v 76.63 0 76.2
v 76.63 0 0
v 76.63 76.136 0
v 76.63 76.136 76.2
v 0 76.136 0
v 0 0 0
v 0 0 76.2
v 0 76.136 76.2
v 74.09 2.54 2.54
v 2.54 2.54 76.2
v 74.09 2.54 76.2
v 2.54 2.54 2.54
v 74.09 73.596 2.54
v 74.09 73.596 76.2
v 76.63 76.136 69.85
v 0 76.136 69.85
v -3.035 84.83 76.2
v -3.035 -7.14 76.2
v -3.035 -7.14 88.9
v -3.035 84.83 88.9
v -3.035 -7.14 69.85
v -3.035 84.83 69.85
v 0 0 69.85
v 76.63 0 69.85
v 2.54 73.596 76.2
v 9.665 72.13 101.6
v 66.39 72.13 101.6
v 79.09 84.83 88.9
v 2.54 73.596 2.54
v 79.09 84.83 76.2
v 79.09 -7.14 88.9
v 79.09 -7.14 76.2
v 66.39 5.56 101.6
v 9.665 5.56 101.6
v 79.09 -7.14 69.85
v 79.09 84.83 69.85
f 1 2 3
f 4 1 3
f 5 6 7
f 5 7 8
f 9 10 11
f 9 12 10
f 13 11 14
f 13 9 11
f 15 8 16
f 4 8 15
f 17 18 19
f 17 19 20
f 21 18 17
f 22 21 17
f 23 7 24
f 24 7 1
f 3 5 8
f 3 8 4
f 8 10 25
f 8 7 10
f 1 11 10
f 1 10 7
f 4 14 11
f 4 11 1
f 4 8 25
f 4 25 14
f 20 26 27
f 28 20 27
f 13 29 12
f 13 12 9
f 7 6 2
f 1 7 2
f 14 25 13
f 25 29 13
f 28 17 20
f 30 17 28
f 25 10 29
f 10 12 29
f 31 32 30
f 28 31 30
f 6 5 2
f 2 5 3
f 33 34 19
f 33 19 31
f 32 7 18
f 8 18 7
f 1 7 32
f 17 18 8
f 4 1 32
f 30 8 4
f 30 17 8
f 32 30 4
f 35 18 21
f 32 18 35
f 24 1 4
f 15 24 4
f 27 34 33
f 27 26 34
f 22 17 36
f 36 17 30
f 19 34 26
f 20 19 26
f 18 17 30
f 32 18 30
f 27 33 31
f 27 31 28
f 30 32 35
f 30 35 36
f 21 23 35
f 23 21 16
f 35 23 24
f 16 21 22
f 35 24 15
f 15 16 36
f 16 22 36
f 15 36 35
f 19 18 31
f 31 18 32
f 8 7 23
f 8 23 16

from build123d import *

# Parameters (mm, degrees)
F0_W     = 76.630168
F0_H     = 76.136313
F1_DEPTH = 76.2
F2_T     = -2.54
F3_W     = 82.124954
F3_H     = 91.969022
F3_W_2   = 76.630168
F3_H_2   = 76.136313
F4_DEPTH = 6.35
F5_W     = 82.124954
F5_H     = 91.969022
F6_DEPTH = 25.4
F7_SIZE  = 12.7


with BuildPart() as f1:
    # F0 (on Top) → F1 (new body)
    with BuildSketch(Plane.XY):
        with Locations((38.315084, 38.068157)):
            Rectangle(F0_W, F0_H)
    extrude(amount=F1_DEPTH)

    # F2
    f2_openings = [f1.faces().sort_by_distance(p)[0] for p in [
        (38.315084, 38.068157, 76.2),
    ]]
    offset(amount=F2_T, openings=f2_openings)


with BuildPart() as f4:
    # F3 (on face) → F4 (new body)
    with BuildSketch(Plane.XY.offset(76.2)):
        with Locations((38.027261, 38.844991)):
            Rectangle(F3_W, F3_H)
        with Locations((38.315084, 38.068157)):
            Rectangle(F3_W_2, F3_H_2, mode=Mode.SUBTRACT)
    extrude(amount=-F4_DEPTH)


with BuildPart() as f6:
    # F5 (on face) → F6 (new body)
    with BuildSketch(Plane.XY.offset(76.2)):
        with Locations((38.027261, 38.844991)):
            Rectangle(F5_W, F5_H)
    extrude(amount=F6_DEPTH)

    # F7
    f7_edges = [f6.edges().sort_by_distance(p)[0] for p in [
        (38.027261, -7.13952, 101.6),
        (-3.035216, 38.844991, 101.6),
        (38.027261, 84.829502, 101.6),
        (79.089738, 38.844991, 101.6),
    ]]
    chamfer(f7_edges, length=F7_SIZE)


solid = Compound([f1.part, f4.part, f6.part])
